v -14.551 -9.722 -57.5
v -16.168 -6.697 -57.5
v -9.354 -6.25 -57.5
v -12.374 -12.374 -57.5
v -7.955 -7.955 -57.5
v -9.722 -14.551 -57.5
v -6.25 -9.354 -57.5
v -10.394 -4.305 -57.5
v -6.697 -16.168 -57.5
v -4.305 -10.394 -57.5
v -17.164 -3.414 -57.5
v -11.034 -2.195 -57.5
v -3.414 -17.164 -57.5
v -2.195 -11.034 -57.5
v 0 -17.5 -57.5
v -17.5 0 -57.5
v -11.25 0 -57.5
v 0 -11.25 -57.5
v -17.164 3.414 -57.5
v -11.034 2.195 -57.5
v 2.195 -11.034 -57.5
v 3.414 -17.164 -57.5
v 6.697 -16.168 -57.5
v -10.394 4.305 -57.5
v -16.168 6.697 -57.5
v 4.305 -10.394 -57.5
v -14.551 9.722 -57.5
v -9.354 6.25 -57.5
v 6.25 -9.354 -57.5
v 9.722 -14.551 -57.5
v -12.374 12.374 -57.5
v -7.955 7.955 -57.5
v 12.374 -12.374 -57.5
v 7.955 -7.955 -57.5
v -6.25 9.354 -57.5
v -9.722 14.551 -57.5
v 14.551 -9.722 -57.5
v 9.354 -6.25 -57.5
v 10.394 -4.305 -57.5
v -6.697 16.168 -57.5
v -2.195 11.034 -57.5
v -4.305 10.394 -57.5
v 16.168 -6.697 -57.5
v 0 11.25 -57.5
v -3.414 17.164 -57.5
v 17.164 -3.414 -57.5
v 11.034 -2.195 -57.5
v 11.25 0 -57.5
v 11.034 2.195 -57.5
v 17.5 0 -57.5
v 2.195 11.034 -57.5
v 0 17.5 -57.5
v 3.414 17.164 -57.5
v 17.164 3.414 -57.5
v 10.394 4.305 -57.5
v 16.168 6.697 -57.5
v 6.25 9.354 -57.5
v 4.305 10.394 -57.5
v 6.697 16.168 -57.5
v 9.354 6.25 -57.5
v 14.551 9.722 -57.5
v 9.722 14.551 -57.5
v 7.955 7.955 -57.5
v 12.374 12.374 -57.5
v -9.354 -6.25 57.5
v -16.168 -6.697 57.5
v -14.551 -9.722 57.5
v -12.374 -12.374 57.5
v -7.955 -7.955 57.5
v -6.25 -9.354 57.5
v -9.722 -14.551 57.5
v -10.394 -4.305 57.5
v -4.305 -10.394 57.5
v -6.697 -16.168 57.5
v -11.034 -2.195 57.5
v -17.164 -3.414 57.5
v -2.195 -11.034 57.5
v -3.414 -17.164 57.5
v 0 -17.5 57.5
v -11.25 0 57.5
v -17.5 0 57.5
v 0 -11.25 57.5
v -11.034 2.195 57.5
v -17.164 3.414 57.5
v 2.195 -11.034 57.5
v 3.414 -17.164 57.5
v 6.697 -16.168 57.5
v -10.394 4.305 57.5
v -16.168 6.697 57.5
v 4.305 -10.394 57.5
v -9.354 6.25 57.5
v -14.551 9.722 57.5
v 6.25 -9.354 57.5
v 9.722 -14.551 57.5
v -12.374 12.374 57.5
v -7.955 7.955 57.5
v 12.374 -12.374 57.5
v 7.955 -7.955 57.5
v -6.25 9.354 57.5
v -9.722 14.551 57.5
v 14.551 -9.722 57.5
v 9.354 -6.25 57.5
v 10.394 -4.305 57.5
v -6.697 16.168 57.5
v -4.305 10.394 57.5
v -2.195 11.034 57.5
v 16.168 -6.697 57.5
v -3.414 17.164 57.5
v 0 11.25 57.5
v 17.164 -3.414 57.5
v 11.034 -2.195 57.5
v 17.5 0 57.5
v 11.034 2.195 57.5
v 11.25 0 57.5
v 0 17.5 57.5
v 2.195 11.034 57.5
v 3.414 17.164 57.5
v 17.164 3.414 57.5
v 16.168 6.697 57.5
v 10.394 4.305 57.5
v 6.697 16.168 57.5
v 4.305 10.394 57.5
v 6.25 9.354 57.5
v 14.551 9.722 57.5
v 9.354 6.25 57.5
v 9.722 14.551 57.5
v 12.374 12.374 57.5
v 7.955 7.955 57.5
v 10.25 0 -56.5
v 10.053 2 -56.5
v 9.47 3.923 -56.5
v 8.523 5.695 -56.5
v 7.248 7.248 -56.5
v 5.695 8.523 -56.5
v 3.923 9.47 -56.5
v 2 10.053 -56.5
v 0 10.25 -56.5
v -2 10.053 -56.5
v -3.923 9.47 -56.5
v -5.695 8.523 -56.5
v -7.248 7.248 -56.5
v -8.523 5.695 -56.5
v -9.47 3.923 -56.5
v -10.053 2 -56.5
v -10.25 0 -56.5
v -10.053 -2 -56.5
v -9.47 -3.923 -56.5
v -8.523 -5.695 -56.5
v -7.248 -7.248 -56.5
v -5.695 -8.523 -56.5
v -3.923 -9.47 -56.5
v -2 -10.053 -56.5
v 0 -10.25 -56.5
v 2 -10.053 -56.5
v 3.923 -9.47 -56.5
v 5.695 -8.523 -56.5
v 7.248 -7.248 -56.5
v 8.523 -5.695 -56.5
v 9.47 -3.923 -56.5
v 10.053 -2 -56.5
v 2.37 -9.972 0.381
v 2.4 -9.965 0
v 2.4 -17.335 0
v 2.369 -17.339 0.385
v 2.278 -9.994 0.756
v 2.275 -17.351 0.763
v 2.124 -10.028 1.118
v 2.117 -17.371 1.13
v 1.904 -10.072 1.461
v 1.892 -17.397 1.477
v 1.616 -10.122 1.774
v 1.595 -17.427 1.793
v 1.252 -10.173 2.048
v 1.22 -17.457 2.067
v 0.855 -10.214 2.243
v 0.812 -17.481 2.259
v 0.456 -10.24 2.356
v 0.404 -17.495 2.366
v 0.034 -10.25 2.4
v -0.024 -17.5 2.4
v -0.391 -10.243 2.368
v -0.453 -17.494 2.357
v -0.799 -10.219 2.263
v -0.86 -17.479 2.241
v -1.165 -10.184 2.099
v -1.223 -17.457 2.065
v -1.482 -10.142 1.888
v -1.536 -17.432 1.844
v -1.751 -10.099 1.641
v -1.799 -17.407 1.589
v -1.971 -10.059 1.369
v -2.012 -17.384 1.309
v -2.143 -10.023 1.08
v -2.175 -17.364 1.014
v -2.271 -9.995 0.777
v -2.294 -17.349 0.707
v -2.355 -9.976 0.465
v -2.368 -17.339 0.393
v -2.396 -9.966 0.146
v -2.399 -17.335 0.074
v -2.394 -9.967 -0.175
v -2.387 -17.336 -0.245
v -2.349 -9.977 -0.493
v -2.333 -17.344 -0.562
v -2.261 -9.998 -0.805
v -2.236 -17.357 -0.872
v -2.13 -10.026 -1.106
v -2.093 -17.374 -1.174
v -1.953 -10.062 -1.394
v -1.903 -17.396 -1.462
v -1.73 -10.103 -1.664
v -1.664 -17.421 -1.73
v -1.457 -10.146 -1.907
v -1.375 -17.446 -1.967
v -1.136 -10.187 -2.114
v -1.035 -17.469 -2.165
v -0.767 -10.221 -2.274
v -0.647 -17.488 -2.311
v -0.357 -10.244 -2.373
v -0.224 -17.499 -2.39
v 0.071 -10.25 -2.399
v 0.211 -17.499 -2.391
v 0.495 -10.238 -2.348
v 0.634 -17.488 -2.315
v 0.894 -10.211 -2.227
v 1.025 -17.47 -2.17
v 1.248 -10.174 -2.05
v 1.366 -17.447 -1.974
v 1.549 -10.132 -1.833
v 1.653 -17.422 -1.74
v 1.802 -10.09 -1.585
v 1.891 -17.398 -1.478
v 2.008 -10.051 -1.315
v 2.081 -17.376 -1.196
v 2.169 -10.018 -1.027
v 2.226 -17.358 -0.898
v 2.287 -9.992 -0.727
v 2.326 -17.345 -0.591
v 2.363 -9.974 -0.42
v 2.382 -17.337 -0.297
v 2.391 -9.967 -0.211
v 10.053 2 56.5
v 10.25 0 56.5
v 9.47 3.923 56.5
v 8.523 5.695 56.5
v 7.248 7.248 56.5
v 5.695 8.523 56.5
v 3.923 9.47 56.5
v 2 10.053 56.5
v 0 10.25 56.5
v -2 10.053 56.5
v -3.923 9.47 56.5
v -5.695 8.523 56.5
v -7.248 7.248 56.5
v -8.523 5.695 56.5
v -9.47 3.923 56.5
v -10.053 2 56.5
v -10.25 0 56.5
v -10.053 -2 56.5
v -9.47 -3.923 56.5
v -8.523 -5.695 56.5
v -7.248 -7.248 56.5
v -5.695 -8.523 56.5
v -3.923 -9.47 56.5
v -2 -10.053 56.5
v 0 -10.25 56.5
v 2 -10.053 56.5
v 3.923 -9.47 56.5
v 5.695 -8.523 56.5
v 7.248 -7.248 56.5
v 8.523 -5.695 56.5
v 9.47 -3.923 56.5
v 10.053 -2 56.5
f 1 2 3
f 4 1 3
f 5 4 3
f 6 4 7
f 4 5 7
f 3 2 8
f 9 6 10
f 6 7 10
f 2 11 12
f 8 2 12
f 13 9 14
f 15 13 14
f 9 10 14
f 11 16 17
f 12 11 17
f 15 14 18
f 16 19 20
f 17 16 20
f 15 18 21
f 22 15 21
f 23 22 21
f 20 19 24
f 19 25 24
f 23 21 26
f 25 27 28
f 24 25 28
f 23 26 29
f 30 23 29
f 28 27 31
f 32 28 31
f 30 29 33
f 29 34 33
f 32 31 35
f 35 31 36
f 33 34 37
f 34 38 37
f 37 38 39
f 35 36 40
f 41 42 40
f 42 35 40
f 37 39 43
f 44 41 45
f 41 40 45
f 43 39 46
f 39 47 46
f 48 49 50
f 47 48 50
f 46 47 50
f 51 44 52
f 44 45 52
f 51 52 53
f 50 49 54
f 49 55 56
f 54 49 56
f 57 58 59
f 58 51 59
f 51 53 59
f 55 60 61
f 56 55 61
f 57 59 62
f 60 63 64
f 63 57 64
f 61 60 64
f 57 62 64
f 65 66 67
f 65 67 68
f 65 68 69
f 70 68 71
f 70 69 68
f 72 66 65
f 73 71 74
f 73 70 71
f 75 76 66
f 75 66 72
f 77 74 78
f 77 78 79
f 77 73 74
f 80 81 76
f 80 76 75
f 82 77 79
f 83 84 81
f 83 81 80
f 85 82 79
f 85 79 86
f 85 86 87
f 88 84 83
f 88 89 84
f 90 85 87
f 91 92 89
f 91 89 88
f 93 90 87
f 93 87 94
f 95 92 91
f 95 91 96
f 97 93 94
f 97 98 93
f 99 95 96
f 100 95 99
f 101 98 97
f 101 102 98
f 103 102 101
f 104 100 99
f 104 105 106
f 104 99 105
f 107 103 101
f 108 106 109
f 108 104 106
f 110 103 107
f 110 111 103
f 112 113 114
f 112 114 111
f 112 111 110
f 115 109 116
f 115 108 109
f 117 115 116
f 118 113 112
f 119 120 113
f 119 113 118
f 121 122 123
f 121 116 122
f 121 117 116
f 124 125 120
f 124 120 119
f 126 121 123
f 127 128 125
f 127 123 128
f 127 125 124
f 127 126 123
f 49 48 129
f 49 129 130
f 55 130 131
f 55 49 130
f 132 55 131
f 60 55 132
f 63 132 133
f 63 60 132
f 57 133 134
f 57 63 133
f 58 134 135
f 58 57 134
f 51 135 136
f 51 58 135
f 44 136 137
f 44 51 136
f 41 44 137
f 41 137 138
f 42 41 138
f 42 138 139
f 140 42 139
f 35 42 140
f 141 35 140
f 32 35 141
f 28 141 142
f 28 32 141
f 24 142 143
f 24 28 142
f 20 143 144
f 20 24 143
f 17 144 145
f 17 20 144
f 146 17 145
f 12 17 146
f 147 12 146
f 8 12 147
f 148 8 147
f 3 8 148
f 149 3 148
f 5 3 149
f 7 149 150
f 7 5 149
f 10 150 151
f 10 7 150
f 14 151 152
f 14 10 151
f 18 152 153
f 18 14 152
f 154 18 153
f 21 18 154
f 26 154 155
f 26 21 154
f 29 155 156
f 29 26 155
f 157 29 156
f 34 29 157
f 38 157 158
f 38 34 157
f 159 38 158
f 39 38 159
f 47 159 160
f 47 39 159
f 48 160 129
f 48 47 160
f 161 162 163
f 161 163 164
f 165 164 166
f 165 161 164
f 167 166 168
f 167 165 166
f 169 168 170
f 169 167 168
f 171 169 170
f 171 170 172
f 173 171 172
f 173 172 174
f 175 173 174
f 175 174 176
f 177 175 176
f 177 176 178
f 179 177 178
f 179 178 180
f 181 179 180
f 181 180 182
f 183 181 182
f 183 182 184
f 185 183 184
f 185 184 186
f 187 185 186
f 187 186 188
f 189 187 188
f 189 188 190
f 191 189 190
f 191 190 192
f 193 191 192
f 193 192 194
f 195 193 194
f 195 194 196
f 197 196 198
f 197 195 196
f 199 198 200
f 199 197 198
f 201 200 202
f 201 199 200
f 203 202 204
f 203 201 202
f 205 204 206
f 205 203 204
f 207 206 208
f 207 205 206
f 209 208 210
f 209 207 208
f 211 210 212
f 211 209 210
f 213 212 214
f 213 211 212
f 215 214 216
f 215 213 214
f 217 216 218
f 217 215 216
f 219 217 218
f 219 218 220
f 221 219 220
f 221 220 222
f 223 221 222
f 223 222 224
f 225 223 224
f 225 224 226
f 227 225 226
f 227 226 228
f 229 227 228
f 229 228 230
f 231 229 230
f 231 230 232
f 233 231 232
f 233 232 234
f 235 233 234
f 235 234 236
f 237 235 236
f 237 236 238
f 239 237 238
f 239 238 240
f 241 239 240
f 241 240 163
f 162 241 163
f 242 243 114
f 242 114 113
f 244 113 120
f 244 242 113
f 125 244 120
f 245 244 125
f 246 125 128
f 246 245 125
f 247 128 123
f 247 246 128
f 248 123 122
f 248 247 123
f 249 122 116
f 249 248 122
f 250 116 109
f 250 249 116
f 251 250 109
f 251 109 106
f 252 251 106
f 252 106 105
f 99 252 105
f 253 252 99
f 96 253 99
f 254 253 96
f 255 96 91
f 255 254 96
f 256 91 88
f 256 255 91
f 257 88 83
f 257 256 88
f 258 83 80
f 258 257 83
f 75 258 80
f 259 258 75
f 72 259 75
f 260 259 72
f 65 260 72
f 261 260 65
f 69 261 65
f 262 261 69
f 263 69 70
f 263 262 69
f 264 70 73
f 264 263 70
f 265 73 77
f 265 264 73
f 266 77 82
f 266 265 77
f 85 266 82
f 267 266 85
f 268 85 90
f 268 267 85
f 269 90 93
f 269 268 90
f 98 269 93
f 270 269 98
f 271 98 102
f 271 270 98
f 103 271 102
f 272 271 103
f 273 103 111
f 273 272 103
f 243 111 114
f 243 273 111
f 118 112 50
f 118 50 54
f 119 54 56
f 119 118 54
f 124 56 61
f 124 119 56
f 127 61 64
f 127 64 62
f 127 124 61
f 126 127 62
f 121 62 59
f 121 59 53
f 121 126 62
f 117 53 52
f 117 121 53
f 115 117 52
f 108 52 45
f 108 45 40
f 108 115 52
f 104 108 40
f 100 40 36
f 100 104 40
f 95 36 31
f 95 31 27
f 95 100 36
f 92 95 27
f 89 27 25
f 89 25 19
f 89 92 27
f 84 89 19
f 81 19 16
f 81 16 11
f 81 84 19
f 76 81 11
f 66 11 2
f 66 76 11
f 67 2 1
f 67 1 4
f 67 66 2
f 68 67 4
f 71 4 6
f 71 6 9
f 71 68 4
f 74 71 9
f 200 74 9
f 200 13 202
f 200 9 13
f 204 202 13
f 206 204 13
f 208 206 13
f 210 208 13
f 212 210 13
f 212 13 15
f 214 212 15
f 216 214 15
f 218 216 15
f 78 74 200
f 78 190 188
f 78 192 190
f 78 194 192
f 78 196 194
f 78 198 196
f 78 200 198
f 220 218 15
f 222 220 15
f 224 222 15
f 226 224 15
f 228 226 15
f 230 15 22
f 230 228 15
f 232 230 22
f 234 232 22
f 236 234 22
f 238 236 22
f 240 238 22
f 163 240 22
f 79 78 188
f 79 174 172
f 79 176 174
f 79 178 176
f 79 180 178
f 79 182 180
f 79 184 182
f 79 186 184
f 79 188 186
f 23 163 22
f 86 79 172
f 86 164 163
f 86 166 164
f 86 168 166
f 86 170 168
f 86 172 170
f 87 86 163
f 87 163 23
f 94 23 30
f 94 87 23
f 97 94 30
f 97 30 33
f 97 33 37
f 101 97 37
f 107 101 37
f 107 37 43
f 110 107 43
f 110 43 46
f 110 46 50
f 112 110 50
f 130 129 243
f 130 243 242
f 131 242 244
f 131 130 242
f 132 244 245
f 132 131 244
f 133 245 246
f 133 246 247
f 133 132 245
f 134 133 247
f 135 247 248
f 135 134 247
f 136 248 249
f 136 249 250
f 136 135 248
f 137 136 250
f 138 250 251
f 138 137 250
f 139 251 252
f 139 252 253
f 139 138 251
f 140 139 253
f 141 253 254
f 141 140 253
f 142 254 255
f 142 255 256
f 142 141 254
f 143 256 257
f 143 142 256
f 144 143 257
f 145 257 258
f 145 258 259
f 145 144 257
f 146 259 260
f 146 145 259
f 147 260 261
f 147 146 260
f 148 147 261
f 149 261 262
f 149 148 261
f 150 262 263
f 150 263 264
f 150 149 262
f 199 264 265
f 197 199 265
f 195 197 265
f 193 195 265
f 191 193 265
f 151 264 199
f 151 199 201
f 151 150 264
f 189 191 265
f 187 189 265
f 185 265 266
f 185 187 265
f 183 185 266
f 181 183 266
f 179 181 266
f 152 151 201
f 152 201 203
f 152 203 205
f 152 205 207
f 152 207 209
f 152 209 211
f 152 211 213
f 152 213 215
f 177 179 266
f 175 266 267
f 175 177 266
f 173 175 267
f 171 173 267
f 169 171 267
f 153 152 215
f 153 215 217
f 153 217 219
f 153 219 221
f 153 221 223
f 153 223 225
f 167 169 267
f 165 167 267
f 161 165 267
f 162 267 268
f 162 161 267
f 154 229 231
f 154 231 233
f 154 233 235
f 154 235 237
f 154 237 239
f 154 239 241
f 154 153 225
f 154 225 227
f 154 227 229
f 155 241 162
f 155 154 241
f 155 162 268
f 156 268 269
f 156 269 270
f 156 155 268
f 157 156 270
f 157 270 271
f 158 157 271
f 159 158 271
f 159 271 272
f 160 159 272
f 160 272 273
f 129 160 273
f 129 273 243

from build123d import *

# Parameters (mm, degrees)
F0_R     = 17.5
F0_R_2   = 10.25
F1_DEPTH = 57.5
F2_R     = 2.4
F3_DEPTH = 25
F4_SIZE  = 1
F5_SIZE  = 1


with BuildPart() as f1:
    # F0 (on Top) → F1 (new body, symmetric)
    with BuildSketch(Plane.XY):
        Circle(F0_R)
        Circle(F0_R_2, mode=Mode.SUBTRACT)
    extrude(amount=F1_DEPTH, both=True)

    # F2 (on Front) → F3 (cut)
    with BuildSketch(Plane.XZ):
        Circle(F2_R)
    extrude(amount=F3_DEPTH, mode=Mode.SUBTRACT)

    # F4
    f4_edges = [f1.edges().sort_by_distance(p)[0] for p in [
        (-10.25, 0, 57.5),
    ]]
    chamfer(f4_edges, length=F4_SIZE)

    # F5
    f5_edges = [f1.edges().sort_by_distance(p)[0] for p in [
        (-10.25, 0, -57.5),
    ]]
    chamfer(f5_edges, length=F5_SIZE)


solid = f1.part
